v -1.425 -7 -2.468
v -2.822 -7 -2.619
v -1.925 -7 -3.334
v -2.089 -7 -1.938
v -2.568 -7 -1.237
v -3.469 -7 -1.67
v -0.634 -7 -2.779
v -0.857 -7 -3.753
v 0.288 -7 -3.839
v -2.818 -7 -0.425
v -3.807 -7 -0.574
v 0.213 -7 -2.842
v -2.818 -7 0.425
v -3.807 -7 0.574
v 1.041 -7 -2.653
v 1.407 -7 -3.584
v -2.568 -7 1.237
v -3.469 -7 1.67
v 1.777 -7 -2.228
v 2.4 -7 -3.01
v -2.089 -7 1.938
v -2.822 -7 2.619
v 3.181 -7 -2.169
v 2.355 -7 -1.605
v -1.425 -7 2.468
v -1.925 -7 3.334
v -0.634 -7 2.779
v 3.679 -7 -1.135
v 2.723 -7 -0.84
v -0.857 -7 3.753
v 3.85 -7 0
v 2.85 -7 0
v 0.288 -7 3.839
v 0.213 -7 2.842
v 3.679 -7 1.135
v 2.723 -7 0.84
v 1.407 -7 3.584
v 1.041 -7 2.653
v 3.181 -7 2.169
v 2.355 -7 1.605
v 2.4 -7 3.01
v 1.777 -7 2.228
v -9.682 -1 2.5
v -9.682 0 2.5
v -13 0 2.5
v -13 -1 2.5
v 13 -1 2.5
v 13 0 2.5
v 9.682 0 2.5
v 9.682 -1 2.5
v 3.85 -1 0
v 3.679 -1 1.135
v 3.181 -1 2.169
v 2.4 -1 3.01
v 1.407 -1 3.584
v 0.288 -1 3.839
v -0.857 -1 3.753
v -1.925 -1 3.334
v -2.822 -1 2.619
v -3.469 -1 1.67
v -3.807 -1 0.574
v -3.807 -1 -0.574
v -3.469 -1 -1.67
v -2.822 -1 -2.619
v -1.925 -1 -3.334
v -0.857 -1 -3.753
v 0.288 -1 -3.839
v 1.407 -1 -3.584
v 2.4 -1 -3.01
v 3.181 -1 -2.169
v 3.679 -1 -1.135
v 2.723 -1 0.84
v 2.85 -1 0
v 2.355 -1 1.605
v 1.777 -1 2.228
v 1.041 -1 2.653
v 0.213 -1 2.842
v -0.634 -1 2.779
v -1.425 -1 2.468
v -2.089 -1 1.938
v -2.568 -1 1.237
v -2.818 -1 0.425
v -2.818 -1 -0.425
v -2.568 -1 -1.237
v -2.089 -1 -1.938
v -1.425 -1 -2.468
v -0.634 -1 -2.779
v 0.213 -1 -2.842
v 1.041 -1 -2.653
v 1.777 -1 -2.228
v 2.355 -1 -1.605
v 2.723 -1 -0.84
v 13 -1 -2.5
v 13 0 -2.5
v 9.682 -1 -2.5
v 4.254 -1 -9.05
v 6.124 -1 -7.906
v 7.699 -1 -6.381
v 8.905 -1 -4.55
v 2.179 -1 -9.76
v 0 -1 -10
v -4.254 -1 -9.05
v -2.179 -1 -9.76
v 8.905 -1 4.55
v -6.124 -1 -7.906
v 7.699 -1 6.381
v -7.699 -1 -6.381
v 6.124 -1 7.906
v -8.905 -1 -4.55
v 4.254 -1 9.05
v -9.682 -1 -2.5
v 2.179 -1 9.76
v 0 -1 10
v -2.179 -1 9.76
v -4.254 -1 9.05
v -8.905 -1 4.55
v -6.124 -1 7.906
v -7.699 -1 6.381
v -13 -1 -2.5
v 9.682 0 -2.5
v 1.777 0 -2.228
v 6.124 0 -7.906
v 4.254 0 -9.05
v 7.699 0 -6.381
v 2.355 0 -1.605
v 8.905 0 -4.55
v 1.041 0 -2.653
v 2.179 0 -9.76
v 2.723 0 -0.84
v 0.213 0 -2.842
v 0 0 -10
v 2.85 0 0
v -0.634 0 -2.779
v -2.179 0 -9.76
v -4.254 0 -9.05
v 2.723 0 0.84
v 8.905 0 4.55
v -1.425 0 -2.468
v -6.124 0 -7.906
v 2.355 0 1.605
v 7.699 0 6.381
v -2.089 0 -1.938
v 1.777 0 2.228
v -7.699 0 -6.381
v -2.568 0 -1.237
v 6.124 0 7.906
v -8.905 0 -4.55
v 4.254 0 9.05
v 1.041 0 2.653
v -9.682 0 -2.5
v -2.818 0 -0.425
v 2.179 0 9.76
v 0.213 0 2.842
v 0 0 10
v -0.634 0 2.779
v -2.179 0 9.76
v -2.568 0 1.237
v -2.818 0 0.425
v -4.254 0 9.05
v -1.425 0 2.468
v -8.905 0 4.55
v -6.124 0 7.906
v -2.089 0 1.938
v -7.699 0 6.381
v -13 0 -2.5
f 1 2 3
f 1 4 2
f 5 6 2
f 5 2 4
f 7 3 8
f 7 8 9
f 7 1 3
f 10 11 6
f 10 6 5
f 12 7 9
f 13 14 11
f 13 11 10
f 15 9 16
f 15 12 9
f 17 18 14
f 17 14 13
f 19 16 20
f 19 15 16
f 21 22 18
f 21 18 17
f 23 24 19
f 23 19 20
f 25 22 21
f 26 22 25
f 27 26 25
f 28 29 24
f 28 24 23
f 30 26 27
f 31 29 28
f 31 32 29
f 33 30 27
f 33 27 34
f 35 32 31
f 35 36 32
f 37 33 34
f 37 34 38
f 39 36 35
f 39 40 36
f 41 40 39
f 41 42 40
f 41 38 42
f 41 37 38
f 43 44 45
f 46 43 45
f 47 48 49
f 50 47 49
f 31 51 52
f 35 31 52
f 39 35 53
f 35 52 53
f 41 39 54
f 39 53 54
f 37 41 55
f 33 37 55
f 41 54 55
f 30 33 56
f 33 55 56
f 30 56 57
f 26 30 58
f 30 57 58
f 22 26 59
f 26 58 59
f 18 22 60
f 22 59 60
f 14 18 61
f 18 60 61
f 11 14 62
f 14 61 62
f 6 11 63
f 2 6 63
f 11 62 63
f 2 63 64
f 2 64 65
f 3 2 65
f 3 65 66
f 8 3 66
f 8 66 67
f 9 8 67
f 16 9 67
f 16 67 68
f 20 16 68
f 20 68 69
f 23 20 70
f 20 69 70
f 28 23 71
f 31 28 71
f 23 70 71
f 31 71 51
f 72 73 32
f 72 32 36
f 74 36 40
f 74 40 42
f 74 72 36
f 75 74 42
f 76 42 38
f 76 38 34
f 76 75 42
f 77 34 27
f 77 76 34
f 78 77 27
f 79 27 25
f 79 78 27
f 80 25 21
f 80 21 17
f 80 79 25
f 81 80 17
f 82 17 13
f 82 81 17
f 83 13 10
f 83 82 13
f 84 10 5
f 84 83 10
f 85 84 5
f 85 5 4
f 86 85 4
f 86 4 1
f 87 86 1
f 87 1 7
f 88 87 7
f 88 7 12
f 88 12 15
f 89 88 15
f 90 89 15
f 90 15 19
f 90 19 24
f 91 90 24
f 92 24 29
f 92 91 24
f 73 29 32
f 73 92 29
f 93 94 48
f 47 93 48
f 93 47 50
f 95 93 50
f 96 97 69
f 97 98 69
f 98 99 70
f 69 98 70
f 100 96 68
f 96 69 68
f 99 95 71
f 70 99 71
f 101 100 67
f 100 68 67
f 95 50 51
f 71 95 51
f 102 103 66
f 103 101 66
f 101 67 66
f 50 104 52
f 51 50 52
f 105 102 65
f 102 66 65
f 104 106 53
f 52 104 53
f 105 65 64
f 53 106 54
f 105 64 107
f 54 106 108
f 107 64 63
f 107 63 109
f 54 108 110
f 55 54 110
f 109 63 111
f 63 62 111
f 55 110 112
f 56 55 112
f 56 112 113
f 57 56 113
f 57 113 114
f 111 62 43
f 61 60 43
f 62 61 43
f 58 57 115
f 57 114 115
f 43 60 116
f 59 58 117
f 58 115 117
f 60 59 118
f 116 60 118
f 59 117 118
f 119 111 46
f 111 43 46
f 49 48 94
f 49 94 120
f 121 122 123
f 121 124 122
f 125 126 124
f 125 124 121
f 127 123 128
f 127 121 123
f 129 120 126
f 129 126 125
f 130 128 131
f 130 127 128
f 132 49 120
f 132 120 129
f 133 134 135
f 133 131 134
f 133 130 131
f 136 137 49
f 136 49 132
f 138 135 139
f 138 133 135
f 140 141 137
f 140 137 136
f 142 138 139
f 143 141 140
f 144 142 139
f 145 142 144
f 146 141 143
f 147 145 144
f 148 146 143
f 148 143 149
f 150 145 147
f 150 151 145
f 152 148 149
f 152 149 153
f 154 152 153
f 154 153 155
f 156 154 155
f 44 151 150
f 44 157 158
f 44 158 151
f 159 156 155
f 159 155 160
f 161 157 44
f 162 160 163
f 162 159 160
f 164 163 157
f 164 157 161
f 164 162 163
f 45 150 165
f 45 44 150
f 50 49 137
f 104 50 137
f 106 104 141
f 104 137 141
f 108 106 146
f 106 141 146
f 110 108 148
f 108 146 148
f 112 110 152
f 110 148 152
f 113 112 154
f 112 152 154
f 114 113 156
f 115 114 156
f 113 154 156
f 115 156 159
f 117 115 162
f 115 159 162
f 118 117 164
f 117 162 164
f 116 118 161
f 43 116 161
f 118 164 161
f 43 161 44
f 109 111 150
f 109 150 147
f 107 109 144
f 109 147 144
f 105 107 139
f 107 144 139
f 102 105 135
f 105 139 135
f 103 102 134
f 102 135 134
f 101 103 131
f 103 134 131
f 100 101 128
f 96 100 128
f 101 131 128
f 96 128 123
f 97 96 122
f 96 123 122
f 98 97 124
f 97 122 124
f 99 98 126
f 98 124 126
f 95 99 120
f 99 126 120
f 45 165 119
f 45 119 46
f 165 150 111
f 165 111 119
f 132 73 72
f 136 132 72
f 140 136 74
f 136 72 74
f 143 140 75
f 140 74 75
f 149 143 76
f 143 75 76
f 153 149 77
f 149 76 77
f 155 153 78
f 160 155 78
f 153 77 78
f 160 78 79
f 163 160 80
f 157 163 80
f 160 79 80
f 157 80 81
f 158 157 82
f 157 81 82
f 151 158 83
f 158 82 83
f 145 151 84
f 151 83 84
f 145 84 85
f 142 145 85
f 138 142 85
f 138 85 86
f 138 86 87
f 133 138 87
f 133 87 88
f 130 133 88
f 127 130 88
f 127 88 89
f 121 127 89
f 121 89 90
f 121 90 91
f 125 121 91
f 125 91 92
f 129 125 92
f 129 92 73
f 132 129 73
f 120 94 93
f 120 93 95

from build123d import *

# Parameters (mm, degrees)
F0_R          = 10
F1_DEPTH      = 1
F3_W          = 26
F3_H          = 5
F4_DEPTH      = 1
F5_R          = 3.85
F5_R_2        = 2.85
F7_DEPTH      = 6
F6_R          = 2.85
F8_DEPTH      = 6.001
F8_DEPTH_BACK = 1.001


with BuildPart() as f1:
    # F0 (on Front) → F1 (new body)
    with BuildSketch(Plane.XZ):
        Circle(F0_R)
    extrude(amount=F1_DEPTH)

    # F3 (on face) → F4 (join)
    with BuildSketch(Plane(origin=(0, 0, 0), x_dir=(-1, 0, 0), z_dir=(0, 1, 0))):
        Rectangle(F3_W, F3_H)
    extrude(amount=-F4_DEPTH)

    # F5 (on face) → F7 (join)
    with BuildSketch(Plane.XZ.offset(1)):
        Circle(F5_R)
        Circle(F5_R_2, mode=Mode.SUBTRACT)
    extrude(amount=F7_DEPTH)

    # F6 (on face) → F8 (cut, two sides)
    with BuildSketch(Plane.XZ.offset(1)) as f8_sk:
        Circle(F6_R)
    extrude(amount=F8_DEPTH, mode=Mode.SUBTRACT)
    extrude(f8_sk.sketch, amount=-F8_DEPTH_BACK, mode=Mode.SUBTRACT)


solid = f1.part
